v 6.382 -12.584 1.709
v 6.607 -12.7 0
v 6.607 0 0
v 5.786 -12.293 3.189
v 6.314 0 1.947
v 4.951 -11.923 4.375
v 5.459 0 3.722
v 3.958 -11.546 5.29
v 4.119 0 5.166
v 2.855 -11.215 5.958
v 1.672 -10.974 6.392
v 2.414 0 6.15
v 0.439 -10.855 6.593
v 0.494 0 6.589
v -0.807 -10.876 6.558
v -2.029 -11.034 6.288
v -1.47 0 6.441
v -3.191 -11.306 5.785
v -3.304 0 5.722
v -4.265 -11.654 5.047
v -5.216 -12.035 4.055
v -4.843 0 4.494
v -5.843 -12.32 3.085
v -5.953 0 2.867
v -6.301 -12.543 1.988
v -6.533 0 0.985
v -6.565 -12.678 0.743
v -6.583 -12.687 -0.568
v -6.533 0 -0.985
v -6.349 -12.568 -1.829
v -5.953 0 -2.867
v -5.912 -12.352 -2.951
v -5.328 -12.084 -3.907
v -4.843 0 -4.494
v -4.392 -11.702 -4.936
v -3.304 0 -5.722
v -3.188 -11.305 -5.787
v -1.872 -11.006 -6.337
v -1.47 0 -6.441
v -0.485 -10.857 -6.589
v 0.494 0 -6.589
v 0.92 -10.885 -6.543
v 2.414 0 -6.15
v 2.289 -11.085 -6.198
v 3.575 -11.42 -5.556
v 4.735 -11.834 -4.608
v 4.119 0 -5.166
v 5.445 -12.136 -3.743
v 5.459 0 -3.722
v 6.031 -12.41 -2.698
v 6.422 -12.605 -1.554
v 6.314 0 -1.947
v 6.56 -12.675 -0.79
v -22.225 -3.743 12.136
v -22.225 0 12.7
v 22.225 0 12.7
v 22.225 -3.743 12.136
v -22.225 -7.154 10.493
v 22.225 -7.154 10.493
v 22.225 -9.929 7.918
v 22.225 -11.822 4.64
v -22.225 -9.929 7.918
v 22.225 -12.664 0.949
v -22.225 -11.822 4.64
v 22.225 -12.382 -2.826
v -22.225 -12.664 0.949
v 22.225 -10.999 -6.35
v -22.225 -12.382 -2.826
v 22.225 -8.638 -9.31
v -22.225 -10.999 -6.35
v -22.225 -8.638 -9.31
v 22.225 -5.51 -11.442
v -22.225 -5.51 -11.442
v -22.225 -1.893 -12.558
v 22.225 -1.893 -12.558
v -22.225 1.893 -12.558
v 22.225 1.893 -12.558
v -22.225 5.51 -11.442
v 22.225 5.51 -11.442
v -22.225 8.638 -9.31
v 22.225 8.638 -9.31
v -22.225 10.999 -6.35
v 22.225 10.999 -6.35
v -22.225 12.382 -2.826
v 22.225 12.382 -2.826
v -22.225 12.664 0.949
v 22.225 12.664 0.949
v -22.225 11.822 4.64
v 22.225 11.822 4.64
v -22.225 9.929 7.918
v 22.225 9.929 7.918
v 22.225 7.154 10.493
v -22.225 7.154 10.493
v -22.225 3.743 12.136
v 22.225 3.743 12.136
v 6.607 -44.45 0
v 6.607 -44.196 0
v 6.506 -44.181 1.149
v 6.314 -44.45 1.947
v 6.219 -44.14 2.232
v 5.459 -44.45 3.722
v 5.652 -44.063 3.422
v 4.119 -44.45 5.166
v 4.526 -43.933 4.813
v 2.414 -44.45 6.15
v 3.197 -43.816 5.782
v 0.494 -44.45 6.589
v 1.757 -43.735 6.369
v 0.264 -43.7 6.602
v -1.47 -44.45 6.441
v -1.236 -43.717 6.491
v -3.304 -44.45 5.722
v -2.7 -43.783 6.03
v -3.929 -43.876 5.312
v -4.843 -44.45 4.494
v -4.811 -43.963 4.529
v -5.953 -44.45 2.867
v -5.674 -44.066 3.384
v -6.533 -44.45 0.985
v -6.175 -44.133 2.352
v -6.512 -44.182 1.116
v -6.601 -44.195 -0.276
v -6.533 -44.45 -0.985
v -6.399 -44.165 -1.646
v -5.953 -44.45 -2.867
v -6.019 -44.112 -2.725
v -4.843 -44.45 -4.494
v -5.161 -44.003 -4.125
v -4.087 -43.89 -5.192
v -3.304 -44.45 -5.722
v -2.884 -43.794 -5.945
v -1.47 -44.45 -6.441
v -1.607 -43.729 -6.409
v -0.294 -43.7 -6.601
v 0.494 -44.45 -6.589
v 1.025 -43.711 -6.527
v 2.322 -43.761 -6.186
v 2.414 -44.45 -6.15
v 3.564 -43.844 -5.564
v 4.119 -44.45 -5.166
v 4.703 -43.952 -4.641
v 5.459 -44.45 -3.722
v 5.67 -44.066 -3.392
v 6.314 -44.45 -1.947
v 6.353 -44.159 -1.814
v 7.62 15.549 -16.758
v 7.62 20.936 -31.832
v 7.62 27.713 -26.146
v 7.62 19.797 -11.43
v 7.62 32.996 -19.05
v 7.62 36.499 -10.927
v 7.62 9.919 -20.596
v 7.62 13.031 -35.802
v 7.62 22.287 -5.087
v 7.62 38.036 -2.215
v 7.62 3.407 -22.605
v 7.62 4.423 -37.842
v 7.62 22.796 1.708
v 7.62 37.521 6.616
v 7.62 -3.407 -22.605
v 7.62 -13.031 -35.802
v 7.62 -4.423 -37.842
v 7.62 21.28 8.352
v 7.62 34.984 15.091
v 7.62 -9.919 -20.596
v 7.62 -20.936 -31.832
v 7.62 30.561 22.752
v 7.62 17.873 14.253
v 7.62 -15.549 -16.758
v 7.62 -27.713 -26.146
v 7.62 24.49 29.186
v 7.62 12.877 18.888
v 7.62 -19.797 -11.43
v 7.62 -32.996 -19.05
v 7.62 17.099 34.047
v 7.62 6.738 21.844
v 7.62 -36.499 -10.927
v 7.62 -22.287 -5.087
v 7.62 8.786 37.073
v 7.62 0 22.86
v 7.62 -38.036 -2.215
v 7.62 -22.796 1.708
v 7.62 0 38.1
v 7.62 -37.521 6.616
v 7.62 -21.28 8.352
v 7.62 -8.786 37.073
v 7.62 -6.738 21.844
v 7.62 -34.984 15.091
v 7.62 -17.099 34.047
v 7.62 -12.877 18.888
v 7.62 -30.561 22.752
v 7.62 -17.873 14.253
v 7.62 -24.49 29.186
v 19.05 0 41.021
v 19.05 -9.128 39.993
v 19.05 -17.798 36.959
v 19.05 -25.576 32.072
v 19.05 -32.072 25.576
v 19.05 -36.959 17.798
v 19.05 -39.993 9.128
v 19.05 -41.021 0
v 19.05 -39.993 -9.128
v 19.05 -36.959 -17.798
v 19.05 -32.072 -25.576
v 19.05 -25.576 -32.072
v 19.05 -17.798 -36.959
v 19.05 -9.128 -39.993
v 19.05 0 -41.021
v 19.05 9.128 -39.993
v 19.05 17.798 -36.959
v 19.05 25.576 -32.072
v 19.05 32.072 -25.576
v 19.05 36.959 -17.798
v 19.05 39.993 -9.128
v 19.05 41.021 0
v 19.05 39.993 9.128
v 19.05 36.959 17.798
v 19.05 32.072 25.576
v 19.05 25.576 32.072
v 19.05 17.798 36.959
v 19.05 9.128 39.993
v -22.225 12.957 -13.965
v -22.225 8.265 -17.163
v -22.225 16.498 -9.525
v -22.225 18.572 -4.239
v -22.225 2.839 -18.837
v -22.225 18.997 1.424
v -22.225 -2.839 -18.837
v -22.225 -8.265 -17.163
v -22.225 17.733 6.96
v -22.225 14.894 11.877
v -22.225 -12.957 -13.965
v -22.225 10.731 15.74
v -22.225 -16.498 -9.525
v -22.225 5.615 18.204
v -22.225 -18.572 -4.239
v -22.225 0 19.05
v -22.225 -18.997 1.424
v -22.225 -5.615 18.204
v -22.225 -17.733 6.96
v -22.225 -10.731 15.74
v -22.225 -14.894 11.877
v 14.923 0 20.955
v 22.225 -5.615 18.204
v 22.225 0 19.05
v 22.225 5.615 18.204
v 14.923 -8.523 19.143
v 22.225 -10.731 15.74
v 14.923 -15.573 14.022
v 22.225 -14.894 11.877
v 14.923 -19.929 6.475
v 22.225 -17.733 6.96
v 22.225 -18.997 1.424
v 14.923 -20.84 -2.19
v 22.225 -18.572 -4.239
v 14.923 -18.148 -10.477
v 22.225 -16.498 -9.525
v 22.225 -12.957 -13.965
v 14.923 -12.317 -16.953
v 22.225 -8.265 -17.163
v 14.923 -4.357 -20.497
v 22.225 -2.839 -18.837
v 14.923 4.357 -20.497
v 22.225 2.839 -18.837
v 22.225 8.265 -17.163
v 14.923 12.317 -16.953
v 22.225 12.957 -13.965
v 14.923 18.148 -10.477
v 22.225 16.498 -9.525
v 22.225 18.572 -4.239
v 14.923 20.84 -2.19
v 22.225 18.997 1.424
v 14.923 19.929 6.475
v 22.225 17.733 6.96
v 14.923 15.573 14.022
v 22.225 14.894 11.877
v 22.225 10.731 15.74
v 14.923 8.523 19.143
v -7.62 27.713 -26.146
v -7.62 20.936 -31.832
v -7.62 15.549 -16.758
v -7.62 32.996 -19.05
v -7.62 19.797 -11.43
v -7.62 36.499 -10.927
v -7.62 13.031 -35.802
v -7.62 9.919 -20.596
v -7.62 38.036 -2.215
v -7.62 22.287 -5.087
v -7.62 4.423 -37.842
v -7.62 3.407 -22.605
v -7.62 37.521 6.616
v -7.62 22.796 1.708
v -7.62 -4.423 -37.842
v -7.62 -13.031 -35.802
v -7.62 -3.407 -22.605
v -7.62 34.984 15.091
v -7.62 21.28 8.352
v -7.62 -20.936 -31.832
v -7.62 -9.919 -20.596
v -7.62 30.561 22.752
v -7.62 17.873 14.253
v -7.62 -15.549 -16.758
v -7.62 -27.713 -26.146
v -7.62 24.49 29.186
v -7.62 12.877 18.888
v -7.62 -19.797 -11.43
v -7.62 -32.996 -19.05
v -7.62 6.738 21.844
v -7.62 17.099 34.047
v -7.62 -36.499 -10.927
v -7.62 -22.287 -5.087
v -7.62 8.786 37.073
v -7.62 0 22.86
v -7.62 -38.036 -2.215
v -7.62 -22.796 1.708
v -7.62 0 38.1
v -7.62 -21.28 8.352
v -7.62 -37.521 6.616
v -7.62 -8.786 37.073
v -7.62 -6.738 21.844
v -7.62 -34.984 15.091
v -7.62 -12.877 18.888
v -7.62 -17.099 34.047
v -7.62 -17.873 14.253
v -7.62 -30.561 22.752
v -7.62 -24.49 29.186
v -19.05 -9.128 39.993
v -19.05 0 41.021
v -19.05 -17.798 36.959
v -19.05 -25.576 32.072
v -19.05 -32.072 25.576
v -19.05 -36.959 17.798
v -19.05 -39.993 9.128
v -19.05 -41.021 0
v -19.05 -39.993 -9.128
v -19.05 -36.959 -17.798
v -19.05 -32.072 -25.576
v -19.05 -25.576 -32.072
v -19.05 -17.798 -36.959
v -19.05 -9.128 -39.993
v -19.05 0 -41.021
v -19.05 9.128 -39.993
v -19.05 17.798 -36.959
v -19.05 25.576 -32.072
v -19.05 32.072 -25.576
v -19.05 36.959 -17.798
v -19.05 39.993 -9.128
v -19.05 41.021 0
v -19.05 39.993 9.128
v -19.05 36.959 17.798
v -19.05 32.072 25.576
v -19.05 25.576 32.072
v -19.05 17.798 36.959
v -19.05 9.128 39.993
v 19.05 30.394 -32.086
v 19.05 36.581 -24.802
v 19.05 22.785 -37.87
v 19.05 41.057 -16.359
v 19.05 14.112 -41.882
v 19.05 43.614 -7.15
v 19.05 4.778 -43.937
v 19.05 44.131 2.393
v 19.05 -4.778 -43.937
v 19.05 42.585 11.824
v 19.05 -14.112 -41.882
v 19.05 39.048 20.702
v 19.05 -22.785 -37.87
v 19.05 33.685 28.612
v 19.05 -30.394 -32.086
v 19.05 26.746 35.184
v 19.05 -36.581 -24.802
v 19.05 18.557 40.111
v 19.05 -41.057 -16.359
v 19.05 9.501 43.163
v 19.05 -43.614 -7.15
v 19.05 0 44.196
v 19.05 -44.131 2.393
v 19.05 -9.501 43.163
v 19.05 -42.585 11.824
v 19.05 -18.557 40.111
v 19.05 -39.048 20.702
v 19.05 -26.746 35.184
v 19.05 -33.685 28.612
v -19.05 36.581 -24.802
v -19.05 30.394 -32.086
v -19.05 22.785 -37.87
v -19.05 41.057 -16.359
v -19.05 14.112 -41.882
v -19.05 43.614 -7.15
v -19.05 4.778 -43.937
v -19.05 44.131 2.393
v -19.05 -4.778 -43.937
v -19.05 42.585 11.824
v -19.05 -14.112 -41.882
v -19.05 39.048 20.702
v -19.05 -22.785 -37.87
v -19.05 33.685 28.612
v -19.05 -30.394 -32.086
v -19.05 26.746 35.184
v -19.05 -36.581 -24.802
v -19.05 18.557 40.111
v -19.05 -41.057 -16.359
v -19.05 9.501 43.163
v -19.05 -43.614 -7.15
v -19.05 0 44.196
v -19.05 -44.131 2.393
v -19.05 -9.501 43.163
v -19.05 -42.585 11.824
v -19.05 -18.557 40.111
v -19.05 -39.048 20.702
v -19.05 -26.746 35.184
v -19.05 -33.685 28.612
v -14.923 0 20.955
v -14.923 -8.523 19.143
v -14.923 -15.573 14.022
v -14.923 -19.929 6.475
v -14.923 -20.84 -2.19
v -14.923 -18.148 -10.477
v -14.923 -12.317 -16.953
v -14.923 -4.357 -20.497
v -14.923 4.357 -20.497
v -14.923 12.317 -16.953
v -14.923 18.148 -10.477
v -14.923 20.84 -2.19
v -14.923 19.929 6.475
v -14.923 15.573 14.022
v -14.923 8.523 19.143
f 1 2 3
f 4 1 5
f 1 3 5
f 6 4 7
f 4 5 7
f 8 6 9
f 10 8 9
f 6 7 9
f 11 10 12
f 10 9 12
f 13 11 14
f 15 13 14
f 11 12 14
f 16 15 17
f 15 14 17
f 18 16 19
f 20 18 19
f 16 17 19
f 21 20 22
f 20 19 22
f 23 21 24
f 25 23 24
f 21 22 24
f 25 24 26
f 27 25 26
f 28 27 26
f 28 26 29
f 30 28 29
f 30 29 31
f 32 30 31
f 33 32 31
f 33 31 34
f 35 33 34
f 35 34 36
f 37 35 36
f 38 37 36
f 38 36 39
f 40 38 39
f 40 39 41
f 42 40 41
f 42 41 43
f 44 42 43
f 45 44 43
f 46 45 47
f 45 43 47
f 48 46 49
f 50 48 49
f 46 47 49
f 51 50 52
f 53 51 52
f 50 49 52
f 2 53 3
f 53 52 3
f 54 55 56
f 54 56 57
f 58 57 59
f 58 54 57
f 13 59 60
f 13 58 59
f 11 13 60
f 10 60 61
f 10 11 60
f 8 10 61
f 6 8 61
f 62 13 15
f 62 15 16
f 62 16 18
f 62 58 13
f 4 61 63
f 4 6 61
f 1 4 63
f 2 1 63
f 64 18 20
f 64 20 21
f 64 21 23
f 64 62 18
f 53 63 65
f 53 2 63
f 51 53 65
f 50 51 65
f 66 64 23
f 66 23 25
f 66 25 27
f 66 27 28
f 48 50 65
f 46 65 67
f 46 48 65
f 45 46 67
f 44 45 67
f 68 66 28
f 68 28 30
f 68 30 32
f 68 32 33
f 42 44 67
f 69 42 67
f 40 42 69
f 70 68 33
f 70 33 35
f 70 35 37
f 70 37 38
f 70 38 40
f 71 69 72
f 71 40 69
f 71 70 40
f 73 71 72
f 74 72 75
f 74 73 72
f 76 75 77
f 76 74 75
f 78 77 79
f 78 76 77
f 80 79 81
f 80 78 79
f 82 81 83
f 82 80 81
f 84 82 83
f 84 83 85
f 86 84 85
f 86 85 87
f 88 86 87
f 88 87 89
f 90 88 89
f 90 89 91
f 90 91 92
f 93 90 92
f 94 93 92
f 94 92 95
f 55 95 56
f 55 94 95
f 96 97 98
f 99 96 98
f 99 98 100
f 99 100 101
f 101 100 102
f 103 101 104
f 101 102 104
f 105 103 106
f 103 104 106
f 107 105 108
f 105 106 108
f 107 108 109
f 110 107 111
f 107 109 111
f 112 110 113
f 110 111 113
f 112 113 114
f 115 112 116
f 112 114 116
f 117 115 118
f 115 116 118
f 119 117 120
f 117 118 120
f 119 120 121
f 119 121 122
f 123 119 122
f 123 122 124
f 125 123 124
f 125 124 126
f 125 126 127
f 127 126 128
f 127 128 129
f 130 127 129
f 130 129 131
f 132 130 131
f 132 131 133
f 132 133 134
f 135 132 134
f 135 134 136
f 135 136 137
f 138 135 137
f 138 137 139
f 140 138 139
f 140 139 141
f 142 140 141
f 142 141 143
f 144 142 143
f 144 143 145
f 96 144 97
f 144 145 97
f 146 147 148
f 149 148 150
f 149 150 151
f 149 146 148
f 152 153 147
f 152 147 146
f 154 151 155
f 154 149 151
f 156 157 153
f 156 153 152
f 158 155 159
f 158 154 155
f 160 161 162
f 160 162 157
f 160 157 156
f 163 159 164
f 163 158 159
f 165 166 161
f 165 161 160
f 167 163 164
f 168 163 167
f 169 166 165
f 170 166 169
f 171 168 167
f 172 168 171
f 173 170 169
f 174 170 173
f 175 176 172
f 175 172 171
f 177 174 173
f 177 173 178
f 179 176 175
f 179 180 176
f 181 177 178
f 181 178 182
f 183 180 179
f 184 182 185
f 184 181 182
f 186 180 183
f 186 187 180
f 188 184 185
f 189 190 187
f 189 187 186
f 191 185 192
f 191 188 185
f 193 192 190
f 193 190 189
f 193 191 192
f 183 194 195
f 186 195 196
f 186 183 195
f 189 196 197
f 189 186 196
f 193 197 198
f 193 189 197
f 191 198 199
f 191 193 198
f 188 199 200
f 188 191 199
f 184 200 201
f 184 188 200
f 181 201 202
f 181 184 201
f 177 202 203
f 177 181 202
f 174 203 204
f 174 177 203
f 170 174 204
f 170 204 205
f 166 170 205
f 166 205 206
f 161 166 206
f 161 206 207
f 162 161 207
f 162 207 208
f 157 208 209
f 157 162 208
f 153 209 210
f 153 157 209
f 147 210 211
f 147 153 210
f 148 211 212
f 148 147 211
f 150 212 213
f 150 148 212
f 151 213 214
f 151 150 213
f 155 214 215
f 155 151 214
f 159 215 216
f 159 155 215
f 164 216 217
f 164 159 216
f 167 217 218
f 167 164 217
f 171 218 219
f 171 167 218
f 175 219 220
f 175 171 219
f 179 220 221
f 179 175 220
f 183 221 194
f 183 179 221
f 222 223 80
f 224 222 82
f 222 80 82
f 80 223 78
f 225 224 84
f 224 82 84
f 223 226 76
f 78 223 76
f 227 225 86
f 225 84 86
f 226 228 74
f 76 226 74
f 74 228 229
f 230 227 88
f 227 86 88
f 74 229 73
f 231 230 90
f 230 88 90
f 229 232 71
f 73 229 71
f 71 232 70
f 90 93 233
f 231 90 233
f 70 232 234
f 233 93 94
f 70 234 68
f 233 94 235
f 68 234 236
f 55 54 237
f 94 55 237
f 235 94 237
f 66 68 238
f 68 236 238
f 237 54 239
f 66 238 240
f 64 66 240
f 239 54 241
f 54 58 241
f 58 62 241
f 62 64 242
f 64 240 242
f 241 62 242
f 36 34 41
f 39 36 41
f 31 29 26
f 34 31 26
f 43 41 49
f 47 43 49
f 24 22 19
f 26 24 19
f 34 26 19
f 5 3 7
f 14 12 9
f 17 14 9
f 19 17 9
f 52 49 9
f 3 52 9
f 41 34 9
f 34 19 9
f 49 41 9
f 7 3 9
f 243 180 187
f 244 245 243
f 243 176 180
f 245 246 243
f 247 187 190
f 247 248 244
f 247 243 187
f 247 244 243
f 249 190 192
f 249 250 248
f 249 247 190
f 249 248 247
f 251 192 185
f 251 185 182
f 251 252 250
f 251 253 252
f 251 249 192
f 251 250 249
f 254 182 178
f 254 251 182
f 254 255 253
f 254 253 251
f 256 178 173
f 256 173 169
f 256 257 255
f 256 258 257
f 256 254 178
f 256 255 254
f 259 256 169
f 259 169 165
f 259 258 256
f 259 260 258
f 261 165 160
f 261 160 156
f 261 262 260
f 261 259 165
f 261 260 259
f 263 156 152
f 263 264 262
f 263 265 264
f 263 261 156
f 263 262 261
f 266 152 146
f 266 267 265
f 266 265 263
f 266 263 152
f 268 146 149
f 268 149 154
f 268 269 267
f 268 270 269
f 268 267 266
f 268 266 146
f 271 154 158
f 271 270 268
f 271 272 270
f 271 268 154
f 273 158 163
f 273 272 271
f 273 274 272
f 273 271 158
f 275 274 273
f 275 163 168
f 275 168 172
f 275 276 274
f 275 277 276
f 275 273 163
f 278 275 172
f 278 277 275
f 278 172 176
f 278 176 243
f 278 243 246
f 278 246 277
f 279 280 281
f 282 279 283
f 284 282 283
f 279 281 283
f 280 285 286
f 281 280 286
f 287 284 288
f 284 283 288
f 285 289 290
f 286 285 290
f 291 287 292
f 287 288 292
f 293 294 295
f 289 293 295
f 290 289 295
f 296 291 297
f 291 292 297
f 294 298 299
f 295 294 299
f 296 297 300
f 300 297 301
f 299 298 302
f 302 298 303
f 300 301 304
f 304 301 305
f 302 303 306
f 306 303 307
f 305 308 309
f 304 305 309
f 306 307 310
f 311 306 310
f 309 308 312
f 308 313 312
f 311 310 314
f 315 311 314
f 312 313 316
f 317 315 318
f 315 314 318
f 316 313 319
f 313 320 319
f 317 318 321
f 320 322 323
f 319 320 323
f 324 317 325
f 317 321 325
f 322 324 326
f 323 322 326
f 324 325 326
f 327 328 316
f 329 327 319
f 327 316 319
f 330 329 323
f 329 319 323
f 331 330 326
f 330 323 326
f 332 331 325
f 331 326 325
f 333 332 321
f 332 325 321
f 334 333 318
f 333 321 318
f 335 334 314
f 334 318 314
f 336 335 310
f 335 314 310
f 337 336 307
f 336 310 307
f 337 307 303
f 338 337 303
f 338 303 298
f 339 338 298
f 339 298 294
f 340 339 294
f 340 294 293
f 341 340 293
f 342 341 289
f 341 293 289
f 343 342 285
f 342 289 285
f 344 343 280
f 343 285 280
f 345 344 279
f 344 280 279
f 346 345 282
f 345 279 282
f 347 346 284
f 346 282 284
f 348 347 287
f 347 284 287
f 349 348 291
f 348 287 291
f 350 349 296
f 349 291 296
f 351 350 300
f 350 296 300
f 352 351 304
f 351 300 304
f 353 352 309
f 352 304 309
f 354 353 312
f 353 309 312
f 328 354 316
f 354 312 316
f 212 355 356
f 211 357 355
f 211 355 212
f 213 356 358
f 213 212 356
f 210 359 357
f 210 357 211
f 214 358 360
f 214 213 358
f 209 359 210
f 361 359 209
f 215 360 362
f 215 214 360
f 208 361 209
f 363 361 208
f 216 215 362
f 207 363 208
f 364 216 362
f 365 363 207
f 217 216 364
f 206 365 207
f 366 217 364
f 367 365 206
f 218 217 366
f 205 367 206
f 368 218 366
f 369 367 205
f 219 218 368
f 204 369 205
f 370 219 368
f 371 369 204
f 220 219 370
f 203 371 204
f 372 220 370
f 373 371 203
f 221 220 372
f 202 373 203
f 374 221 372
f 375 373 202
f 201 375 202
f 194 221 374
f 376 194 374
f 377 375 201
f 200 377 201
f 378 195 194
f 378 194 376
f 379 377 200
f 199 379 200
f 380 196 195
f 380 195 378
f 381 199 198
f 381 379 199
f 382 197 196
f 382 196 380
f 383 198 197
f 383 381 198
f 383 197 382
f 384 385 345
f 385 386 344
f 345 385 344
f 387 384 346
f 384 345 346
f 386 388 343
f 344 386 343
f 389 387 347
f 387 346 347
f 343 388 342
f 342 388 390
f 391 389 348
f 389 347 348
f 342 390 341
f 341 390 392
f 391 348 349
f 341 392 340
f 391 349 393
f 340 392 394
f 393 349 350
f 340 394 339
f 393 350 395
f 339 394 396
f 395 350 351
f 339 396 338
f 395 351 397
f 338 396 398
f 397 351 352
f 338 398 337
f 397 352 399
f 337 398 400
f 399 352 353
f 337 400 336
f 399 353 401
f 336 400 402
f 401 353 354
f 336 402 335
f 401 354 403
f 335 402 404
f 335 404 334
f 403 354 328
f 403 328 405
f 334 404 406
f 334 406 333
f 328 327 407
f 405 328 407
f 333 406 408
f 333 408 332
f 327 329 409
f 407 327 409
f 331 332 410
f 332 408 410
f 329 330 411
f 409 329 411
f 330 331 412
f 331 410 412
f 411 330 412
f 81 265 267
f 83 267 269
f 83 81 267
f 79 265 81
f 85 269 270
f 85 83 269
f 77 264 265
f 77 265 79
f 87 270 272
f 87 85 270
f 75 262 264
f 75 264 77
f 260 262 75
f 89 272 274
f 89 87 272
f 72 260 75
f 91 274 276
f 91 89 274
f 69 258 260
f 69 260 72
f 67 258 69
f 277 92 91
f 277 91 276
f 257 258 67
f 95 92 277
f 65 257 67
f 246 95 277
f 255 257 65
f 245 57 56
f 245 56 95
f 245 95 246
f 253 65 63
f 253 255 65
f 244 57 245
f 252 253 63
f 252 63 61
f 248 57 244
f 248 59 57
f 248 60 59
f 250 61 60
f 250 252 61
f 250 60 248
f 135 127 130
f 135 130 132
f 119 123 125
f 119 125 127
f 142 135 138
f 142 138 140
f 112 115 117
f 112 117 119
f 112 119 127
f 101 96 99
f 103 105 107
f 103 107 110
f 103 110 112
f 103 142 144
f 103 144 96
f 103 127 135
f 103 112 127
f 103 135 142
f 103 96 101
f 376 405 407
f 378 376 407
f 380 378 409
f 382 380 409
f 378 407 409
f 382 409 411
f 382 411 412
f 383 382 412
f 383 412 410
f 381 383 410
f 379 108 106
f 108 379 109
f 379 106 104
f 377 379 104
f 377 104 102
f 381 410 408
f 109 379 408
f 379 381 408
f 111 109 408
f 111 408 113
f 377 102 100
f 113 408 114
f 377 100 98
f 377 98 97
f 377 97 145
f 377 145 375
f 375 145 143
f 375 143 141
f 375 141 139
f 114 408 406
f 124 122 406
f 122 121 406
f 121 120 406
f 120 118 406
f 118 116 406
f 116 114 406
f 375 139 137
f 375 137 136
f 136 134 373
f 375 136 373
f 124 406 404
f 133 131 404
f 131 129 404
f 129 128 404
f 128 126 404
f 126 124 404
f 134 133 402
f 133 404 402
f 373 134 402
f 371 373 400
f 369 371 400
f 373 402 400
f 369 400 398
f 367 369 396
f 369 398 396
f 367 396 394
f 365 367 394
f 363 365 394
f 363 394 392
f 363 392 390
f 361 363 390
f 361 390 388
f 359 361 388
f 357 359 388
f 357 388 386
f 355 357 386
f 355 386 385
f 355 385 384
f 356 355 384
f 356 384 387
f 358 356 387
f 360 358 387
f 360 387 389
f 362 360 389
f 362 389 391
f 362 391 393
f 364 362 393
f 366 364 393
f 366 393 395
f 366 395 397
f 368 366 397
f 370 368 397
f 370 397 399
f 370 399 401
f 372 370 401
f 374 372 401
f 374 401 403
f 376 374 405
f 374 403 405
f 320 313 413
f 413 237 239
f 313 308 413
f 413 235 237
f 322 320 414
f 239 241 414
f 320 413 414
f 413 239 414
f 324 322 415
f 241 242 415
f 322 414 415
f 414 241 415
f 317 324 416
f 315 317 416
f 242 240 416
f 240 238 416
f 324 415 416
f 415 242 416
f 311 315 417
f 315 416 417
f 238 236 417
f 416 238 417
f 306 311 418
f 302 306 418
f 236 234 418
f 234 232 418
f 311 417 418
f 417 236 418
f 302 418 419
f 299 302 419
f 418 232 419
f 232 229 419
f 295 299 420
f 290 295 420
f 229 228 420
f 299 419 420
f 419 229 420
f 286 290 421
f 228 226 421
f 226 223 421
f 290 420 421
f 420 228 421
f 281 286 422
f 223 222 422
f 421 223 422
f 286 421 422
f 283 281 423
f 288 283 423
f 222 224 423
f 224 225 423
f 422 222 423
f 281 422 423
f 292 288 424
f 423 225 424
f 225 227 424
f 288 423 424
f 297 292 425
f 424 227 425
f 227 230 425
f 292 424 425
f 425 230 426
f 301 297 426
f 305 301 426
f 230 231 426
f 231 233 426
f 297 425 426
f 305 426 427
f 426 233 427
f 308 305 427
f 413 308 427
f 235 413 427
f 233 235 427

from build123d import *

# Parameters (mm, degrees)
F3_R     = 6.607149
F4_DEPTH = 44.45


with BuildPart() as f1:
    # F0 (on Front) → F1 (revolve)
    with BuildSketch(Plane.XZ):
        Polygon((-22.225, 12.7), (0, 12.7), (0, 44.196), (-19.05, 44.196), (-19.05, 41.021), (-7.62, 38.1), (-7.62, 22.86), (-22.225, 19.05), align=None)
    revolve(axis=Axis((-1.534584, 0, 0), (1, 0, 0)))

    # F2: F1 across face


with BuildPart() as f1_1:
    add(f1.part)
    add(f1.part.mirror(Plane.YZ))

    # F3 (on Front) → F4 (join)
    with BuildSketch(Plane.XZ):
        Circle(F3_R)
    extrude(amount=F4_DEPTH)


solid = f1_1.part
